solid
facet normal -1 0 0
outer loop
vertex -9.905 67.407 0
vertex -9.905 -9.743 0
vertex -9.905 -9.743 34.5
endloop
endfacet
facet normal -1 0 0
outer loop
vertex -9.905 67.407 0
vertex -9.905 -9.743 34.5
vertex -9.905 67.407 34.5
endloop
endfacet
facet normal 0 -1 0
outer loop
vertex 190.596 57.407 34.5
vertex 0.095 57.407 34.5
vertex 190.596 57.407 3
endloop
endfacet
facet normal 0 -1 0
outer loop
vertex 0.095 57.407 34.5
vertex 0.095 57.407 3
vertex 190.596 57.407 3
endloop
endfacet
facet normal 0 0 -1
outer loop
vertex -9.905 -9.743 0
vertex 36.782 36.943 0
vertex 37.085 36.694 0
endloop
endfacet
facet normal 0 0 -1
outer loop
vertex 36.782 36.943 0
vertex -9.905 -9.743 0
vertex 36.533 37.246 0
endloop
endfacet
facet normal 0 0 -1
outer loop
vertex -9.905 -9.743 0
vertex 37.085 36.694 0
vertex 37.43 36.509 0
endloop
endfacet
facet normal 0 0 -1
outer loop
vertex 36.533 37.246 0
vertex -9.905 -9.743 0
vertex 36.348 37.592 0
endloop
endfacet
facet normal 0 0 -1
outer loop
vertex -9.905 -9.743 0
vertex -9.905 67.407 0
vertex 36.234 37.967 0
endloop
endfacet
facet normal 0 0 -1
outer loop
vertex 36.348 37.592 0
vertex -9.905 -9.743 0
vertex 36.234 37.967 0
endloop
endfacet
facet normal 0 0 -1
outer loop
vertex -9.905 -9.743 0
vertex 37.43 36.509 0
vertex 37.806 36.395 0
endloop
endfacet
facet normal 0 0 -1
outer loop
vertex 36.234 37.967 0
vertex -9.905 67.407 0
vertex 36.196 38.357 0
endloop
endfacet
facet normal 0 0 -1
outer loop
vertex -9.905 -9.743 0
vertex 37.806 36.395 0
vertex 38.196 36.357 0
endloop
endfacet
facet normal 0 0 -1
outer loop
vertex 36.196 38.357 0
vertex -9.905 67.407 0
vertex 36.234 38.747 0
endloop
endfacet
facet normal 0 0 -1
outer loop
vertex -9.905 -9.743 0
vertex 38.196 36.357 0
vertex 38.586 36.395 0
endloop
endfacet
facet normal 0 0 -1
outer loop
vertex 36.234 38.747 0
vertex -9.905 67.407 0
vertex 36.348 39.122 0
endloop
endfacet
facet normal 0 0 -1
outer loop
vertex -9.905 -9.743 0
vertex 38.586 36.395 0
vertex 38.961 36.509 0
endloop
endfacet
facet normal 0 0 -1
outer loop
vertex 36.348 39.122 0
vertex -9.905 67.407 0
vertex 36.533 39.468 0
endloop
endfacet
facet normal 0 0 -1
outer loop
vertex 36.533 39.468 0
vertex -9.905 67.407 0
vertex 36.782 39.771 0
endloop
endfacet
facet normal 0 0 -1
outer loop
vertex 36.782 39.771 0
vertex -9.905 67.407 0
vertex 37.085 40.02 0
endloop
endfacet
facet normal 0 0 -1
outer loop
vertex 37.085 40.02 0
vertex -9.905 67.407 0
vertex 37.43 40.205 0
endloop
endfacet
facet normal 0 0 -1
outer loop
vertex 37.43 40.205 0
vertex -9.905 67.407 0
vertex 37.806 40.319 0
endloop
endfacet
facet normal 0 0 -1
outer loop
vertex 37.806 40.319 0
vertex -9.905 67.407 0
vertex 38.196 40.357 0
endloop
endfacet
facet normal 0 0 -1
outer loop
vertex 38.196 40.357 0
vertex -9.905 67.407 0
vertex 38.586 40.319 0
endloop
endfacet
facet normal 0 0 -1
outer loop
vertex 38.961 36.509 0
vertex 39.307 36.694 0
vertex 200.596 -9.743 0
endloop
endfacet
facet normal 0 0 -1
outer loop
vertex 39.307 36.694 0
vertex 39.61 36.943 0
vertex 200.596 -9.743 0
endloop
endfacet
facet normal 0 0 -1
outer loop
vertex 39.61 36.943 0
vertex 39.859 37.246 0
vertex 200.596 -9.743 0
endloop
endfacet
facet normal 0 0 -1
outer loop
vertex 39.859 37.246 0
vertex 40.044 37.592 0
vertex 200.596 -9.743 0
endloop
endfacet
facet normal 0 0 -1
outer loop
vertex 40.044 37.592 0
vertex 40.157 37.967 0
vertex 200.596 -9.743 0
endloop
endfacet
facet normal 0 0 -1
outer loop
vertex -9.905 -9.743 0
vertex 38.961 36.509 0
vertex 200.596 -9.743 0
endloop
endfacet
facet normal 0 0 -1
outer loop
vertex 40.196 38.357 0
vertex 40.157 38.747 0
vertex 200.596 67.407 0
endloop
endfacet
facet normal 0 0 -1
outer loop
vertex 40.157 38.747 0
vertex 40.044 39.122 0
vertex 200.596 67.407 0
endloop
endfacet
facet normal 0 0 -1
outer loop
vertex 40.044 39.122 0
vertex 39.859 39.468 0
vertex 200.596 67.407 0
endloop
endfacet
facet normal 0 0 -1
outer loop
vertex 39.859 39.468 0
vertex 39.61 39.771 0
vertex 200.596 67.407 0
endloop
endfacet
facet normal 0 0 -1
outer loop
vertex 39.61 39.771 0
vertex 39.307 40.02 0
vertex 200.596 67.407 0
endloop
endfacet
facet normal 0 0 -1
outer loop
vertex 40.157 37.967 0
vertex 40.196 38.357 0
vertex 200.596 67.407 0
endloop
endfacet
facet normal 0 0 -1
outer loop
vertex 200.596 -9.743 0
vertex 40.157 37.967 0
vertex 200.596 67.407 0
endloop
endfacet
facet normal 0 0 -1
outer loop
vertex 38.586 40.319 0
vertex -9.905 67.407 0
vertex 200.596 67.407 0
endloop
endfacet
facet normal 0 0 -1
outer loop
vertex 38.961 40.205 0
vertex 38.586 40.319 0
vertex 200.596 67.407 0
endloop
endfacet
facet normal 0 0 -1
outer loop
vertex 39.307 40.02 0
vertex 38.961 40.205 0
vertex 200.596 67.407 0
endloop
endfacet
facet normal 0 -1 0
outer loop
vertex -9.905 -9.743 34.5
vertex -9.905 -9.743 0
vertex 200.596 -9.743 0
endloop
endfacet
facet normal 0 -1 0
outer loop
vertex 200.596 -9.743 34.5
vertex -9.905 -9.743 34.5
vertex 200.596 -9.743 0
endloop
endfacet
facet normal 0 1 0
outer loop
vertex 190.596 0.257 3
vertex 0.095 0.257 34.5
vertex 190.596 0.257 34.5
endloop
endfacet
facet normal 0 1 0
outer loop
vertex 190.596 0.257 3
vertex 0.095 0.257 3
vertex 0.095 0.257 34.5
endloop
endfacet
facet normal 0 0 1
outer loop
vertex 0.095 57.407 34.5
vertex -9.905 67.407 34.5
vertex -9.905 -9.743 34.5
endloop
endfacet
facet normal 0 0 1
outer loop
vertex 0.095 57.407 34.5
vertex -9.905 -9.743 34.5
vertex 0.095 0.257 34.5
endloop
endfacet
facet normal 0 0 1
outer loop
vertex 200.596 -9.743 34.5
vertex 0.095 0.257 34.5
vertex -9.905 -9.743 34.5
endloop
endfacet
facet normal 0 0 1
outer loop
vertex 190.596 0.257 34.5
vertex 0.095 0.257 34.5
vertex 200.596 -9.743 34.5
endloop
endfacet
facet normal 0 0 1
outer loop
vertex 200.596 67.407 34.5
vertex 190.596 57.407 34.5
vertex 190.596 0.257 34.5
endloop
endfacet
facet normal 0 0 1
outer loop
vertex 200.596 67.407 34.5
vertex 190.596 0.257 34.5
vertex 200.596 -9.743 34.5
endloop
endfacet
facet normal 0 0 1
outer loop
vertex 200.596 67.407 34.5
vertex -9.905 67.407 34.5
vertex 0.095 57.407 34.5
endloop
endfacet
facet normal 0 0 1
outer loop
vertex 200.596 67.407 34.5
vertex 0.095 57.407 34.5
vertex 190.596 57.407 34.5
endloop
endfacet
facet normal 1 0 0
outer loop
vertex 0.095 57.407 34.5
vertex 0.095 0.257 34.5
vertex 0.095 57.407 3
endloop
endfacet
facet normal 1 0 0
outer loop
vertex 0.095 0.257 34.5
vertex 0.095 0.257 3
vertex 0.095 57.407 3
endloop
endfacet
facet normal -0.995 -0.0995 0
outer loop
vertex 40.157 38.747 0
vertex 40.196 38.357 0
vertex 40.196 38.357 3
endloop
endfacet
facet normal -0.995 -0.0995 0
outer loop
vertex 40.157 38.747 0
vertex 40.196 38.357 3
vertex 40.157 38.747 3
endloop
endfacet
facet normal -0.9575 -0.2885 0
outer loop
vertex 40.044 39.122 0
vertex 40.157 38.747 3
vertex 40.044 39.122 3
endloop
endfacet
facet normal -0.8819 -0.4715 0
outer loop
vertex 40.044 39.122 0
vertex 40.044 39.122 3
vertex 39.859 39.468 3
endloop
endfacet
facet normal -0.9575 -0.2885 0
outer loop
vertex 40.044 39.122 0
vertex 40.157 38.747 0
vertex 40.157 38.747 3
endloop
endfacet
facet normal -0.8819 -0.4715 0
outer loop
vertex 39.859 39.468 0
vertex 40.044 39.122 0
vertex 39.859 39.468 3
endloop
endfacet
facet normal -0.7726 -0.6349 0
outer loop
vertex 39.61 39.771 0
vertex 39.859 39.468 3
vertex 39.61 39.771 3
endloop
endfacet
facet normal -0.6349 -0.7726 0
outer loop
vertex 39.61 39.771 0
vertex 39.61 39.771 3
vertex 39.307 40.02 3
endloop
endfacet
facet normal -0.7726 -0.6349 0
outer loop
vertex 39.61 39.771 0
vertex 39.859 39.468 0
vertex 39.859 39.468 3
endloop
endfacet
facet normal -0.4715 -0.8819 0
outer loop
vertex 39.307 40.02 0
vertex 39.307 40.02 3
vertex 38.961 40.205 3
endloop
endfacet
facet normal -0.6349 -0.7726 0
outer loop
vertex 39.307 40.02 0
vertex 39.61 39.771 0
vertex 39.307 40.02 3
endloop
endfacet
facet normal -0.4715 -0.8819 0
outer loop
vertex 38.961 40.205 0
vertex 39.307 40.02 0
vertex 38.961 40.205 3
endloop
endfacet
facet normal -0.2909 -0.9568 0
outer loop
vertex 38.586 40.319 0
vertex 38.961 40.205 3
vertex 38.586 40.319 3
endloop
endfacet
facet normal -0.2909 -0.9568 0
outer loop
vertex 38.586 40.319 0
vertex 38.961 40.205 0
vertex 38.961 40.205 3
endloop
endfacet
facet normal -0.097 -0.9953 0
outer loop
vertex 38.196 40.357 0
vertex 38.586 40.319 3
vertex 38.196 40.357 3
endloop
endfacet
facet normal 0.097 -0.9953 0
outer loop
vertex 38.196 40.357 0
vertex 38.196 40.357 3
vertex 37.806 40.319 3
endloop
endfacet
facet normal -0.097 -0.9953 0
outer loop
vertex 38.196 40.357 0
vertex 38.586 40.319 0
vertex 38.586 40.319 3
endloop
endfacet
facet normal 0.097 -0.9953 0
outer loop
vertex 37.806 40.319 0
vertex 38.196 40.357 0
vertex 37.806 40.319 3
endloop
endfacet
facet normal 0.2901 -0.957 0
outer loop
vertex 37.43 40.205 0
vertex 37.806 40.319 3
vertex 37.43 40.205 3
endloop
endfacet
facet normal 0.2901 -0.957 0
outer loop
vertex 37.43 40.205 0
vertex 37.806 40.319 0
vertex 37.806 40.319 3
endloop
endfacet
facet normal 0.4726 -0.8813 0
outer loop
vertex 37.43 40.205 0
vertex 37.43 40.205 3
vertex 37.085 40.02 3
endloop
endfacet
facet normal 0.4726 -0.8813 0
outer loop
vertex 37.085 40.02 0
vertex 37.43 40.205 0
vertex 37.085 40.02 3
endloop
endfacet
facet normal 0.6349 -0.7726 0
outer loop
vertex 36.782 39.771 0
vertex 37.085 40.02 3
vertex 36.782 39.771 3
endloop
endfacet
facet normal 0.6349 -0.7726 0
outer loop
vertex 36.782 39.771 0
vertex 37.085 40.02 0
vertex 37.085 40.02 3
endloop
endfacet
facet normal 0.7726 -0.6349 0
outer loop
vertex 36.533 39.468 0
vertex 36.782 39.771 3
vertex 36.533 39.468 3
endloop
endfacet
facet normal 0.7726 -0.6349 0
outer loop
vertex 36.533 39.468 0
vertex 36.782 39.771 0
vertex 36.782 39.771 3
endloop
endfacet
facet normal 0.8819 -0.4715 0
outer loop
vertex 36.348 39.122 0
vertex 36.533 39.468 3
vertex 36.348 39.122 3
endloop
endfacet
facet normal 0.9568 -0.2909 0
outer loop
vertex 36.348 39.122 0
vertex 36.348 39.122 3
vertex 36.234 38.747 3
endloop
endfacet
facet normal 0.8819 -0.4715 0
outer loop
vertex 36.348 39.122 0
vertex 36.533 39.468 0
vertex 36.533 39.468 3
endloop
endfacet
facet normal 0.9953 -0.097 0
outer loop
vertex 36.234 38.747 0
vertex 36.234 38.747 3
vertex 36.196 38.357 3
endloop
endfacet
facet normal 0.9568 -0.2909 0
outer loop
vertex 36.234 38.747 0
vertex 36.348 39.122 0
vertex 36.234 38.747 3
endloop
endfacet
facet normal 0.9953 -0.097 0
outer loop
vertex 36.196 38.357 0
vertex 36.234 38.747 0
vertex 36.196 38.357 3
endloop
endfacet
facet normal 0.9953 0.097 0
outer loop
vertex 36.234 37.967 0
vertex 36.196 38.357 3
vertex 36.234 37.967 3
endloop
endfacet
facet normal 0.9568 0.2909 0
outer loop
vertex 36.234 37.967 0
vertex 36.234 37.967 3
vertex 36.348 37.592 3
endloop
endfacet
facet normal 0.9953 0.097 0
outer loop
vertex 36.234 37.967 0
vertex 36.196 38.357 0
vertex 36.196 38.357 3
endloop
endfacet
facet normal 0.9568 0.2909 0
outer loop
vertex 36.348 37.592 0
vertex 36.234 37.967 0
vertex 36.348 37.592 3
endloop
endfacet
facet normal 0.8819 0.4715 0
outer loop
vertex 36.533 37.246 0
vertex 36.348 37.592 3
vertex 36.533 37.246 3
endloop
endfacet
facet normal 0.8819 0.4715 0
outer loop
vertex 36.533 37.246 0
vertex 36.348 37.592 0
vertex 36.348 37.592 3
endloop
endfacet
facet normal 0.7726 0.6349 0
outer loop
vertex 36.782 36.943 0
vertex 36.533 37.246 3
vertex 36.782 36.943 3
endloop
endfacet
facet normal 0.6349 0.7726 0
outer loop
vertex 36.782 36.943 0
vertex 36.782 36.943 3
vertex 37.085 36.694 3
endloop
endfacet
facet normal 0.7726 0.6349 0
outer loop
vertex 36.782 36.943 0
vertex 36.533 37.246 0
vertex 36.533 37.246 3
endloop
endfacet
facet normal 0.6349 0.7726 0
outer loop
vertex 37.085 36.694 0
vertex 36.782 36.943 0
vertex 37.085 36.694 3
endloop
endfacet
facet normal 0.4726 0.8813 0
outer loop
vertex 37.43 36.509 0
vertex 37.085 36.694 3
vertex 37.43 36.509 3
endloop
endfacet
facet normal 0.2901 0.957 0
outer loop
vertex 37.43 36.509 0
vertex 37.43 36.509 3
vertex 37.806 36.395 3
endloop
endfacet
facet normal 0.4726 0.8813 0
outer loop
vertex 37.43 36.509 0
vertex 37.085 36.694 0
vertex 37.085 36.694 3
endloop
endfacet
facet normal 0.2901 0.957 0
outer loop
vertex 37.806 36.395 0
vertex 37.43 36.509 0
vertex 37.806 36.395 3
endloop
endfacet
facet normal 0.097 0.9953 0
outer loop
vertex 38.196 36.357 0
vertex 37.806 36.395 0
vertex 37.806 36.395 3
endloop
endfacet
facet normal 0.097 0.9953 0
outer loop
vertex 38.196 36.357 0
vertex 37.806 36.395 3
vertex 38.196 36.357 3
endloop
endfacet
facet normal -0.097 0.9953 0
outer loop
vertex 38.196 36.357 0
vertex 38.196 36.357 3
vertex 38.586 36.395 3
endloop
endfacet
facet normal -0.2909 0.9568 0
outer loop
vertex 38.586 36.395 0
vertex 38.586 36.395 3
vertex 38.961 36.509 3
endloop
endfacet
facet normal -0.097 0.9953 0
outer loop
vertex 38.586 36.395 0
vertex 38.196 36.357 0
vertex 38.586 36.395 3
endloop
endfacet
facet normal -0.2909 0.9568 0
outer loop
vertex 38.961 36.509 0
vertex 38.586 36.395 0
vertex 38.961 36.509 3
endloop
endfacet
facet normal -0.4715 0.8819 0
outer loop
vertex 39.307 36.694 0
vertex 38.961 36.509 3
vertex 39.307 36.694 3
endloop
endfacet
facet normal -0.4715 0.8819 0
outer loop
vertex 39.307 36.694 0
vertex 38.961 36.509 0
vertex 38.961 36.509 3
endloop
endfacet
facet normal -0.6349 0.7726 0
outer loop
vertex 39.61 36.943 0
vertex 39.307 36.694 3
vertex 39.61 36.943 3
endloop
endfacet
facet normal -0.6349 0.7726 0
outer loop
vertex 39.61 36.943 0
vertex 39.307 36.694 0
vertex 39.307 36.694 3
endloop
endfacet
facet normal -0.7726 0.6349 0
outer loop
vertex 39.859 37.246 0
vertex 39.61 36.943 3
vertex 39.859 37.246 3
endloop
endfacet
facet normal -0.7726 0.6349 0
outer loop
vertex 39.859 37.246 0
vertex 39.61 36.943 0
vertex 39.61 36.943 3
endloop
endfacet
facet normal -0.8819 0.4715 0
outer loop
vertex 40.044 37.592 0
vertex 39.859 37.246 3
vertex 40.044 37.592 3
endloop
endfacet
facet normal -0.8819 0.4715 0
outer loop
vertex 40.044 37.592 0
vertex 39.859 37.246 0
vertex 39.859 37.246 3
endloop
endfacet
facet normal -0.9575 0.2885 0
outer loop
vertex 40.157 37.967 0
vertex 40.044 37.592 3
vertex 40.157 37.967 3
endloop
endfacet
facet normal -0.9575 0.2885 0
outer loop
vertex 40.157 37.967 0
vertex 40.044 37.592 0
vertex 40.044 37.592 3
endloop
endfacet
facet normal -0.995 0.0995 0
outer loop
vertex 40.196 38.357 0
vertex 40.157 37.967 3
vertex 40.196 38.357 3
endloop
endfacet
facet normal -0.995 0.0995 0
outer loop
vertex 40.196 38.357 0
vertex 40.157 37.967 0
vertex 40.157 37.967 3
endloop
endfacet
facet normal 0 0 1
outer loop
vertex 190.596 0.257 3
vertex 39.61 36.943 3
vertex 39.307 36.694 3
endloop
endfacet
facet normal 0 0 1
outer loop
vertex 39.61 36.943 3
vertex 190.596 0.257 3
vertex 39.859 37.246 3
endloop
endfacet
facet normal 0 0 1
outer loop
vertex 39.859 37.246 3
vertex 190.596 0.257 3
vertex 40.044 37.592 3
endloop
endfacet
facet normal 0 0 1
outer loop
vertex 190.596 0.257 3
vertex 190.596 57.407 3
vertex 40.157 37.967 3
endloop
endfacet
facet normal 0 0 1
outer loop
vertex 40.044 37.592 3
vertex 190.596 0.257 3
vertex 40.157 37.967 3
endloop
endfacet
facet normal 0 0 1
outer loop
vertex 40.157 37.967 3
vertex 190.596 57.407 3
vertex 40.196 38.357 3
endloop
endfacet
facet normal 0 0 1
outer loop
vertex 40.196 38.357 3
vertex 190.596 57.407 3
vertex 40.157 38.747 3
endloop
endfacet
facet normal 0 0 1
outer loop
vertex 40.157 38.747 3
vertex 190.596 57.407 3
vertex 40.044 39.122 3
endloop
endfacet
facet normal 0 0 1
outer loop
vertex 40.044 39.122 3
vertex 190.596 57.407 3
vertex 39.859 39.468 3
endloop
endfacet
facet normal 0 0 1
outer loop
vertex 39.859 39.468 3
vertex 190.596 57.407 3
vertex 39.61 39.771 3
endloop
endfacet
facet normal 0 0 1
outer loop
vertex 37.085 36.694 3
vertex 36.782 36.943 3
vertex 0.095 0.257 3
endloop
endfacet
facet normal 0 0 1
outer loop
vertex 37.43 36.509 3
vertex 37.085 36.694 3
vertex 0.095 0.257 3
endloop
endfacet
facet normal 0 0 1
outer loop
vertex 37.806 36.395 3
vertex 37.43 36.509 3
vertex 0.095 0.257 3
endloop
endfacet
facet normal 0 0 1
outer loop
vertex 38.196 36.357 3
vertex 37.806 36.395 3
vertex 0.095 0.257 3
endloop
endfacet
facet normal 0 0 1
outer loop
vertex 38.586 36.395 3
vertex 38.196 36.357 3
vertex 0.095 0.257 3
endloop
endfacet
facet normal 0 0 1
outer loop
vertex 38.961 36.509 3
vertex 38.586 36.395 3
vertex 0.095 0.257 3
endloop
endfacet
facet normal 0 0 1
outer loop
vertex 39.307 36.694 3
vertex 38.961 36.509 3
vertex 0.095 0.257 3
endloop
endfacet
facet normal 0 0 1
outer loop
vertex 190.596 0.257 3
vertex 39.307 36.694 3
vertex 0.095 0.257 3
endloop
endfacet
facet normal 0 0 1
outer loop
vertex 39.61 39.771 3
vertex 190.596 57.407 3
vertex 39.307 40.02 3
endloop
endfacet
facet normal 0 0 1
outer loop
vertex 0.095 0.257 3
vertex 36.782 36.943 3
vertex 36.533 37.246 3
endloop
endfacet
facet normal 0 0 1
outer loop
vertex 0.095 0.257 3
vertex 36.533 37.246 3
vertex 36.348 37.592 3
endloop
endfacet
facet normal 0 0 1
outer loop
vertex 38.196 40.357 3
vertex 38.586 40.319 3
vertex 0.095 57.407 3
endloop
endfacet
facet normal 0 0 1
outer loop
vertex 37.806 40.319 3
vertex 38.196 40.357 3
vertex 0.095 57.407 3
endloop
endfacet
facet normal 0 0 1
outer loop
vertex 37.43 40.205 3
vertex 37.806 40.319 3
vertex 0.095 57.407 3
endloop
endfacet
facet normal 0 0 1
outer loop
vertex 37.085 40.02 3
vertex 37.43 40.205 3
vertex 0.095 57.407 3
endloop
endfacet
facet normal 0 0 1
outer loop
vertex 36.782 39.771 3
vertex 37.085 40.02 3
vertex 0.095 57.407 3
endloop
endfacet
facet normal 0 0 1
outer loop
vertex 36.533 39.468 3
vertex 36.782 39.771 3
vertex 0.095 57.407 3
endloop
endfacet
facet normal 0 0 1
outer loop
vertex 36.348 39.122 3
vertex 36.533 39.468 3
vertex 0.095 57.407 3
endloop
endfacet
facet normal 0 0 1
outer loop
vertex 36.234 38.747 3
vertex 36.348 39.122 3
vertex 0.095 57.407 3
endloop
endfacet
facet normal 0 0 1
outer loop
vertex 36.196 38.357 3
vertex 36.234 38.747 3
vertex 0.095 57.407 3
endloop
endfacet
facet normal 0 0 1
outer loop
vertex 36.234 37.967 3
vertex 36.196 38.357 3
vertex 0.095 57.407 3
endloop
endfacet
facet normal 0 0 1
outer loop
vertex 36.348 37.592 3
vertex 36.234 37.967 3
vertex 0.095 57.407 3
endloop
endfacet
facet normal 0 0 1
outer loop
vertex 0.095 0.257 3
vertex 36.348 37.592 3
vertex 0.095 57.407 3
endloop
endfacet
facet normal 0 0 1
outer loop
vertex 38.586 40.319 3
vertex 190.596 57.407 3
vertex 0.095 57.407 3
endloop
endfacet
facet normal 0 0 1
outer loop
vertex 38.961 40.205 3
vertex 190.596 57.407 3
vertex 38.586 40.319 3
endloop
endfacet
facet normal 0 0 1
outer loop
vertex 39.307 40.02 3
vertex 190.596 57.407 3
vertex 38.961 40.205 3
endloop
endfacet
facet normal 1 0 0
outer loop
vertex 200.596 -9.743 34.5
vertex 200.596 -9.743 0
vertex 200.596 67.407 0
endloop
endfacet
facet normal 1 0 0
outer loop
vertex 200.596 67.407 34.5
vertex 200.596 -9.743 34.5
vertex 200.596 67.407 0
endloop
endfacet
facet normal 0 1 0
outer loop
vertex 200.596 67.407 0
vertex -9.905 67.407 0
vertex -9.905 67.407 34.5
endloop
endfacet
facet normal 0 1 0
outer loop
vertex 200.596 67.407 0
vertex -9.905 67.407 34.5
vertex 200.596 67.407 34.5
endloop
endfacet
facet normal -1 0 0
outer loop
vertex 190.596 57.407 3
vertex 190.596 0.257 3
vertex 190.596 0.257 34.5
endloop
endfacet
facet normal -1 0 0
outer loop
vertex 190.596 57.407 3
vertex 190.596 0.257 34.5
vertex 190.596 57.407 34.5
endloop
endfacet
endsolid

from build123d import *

# Parameters (mm, degrees)
SKETCH_2_W                 = 210.5009
SKETCH_2_H                 = 77.1505
EXTRUDE_1_DEPTH            = 34.5
SHELL_1_T                  = -10
SHELL_1_THICKNESS_2_FACE_W = 190.5009
SHELL_1_THICKNESS_2_FACE_H = 57.1505
SHELL_1_THICKNESS_2_DEPTH  = 7
SKETCH_3_R                 = 2
CUT_EXTRUDE_8_DEPTH        = 3


with BuildPart() as part:
    # 草图2 → 凸台-拉伸1 (new body)
    with BuildSketch(Plane.XY):
        with Locations((95.3455423, 28.832065)):
            Rectangle(SKETCH_2_W, SKETCH_2_H)
    extrude(amount=EXTRUDE_1_DEPTH)

    # 抽壳1
    shell_1_openings = [part.faces().sort_by_distance(p)[0] for p in [
        (95.3455423, 28.832065, 34.5),
    ]]
    offset(amount=SHELL_1_T, openings=shell_1_openings, kind=Kind.INTERSECTION)

    # 抽壳1 thickness 2 face (on inner face of the shell) → 抽壳1 thickness 2 (cut)
    with BuildSketch(Plane(origin=(95.3455423, 28.832065, 10), x_dir=(-1, 0, 0), z_dir=(0, 0, -1))):
        Rectangle(SHELL_1_THICKNESS_2_FACE_W, SHELL_1_THICKNESS_2_FACE_H)
    extrude(amount=SHELL_1_THICKNESS_2_DEPTH, mode=Mode.SUBTRACT)

    # 草图3 → 切除-拉伸8 (cut)
    with BuildSketch(Plane.XY):
        with Locations((38.19575, 38.357)):
            Circle(SKETCH_3_R)
    extrude(amount=CUT_EXTRUDE_8_DEPTH, mode=Mode.SUBTRACT)


solid = part.part
